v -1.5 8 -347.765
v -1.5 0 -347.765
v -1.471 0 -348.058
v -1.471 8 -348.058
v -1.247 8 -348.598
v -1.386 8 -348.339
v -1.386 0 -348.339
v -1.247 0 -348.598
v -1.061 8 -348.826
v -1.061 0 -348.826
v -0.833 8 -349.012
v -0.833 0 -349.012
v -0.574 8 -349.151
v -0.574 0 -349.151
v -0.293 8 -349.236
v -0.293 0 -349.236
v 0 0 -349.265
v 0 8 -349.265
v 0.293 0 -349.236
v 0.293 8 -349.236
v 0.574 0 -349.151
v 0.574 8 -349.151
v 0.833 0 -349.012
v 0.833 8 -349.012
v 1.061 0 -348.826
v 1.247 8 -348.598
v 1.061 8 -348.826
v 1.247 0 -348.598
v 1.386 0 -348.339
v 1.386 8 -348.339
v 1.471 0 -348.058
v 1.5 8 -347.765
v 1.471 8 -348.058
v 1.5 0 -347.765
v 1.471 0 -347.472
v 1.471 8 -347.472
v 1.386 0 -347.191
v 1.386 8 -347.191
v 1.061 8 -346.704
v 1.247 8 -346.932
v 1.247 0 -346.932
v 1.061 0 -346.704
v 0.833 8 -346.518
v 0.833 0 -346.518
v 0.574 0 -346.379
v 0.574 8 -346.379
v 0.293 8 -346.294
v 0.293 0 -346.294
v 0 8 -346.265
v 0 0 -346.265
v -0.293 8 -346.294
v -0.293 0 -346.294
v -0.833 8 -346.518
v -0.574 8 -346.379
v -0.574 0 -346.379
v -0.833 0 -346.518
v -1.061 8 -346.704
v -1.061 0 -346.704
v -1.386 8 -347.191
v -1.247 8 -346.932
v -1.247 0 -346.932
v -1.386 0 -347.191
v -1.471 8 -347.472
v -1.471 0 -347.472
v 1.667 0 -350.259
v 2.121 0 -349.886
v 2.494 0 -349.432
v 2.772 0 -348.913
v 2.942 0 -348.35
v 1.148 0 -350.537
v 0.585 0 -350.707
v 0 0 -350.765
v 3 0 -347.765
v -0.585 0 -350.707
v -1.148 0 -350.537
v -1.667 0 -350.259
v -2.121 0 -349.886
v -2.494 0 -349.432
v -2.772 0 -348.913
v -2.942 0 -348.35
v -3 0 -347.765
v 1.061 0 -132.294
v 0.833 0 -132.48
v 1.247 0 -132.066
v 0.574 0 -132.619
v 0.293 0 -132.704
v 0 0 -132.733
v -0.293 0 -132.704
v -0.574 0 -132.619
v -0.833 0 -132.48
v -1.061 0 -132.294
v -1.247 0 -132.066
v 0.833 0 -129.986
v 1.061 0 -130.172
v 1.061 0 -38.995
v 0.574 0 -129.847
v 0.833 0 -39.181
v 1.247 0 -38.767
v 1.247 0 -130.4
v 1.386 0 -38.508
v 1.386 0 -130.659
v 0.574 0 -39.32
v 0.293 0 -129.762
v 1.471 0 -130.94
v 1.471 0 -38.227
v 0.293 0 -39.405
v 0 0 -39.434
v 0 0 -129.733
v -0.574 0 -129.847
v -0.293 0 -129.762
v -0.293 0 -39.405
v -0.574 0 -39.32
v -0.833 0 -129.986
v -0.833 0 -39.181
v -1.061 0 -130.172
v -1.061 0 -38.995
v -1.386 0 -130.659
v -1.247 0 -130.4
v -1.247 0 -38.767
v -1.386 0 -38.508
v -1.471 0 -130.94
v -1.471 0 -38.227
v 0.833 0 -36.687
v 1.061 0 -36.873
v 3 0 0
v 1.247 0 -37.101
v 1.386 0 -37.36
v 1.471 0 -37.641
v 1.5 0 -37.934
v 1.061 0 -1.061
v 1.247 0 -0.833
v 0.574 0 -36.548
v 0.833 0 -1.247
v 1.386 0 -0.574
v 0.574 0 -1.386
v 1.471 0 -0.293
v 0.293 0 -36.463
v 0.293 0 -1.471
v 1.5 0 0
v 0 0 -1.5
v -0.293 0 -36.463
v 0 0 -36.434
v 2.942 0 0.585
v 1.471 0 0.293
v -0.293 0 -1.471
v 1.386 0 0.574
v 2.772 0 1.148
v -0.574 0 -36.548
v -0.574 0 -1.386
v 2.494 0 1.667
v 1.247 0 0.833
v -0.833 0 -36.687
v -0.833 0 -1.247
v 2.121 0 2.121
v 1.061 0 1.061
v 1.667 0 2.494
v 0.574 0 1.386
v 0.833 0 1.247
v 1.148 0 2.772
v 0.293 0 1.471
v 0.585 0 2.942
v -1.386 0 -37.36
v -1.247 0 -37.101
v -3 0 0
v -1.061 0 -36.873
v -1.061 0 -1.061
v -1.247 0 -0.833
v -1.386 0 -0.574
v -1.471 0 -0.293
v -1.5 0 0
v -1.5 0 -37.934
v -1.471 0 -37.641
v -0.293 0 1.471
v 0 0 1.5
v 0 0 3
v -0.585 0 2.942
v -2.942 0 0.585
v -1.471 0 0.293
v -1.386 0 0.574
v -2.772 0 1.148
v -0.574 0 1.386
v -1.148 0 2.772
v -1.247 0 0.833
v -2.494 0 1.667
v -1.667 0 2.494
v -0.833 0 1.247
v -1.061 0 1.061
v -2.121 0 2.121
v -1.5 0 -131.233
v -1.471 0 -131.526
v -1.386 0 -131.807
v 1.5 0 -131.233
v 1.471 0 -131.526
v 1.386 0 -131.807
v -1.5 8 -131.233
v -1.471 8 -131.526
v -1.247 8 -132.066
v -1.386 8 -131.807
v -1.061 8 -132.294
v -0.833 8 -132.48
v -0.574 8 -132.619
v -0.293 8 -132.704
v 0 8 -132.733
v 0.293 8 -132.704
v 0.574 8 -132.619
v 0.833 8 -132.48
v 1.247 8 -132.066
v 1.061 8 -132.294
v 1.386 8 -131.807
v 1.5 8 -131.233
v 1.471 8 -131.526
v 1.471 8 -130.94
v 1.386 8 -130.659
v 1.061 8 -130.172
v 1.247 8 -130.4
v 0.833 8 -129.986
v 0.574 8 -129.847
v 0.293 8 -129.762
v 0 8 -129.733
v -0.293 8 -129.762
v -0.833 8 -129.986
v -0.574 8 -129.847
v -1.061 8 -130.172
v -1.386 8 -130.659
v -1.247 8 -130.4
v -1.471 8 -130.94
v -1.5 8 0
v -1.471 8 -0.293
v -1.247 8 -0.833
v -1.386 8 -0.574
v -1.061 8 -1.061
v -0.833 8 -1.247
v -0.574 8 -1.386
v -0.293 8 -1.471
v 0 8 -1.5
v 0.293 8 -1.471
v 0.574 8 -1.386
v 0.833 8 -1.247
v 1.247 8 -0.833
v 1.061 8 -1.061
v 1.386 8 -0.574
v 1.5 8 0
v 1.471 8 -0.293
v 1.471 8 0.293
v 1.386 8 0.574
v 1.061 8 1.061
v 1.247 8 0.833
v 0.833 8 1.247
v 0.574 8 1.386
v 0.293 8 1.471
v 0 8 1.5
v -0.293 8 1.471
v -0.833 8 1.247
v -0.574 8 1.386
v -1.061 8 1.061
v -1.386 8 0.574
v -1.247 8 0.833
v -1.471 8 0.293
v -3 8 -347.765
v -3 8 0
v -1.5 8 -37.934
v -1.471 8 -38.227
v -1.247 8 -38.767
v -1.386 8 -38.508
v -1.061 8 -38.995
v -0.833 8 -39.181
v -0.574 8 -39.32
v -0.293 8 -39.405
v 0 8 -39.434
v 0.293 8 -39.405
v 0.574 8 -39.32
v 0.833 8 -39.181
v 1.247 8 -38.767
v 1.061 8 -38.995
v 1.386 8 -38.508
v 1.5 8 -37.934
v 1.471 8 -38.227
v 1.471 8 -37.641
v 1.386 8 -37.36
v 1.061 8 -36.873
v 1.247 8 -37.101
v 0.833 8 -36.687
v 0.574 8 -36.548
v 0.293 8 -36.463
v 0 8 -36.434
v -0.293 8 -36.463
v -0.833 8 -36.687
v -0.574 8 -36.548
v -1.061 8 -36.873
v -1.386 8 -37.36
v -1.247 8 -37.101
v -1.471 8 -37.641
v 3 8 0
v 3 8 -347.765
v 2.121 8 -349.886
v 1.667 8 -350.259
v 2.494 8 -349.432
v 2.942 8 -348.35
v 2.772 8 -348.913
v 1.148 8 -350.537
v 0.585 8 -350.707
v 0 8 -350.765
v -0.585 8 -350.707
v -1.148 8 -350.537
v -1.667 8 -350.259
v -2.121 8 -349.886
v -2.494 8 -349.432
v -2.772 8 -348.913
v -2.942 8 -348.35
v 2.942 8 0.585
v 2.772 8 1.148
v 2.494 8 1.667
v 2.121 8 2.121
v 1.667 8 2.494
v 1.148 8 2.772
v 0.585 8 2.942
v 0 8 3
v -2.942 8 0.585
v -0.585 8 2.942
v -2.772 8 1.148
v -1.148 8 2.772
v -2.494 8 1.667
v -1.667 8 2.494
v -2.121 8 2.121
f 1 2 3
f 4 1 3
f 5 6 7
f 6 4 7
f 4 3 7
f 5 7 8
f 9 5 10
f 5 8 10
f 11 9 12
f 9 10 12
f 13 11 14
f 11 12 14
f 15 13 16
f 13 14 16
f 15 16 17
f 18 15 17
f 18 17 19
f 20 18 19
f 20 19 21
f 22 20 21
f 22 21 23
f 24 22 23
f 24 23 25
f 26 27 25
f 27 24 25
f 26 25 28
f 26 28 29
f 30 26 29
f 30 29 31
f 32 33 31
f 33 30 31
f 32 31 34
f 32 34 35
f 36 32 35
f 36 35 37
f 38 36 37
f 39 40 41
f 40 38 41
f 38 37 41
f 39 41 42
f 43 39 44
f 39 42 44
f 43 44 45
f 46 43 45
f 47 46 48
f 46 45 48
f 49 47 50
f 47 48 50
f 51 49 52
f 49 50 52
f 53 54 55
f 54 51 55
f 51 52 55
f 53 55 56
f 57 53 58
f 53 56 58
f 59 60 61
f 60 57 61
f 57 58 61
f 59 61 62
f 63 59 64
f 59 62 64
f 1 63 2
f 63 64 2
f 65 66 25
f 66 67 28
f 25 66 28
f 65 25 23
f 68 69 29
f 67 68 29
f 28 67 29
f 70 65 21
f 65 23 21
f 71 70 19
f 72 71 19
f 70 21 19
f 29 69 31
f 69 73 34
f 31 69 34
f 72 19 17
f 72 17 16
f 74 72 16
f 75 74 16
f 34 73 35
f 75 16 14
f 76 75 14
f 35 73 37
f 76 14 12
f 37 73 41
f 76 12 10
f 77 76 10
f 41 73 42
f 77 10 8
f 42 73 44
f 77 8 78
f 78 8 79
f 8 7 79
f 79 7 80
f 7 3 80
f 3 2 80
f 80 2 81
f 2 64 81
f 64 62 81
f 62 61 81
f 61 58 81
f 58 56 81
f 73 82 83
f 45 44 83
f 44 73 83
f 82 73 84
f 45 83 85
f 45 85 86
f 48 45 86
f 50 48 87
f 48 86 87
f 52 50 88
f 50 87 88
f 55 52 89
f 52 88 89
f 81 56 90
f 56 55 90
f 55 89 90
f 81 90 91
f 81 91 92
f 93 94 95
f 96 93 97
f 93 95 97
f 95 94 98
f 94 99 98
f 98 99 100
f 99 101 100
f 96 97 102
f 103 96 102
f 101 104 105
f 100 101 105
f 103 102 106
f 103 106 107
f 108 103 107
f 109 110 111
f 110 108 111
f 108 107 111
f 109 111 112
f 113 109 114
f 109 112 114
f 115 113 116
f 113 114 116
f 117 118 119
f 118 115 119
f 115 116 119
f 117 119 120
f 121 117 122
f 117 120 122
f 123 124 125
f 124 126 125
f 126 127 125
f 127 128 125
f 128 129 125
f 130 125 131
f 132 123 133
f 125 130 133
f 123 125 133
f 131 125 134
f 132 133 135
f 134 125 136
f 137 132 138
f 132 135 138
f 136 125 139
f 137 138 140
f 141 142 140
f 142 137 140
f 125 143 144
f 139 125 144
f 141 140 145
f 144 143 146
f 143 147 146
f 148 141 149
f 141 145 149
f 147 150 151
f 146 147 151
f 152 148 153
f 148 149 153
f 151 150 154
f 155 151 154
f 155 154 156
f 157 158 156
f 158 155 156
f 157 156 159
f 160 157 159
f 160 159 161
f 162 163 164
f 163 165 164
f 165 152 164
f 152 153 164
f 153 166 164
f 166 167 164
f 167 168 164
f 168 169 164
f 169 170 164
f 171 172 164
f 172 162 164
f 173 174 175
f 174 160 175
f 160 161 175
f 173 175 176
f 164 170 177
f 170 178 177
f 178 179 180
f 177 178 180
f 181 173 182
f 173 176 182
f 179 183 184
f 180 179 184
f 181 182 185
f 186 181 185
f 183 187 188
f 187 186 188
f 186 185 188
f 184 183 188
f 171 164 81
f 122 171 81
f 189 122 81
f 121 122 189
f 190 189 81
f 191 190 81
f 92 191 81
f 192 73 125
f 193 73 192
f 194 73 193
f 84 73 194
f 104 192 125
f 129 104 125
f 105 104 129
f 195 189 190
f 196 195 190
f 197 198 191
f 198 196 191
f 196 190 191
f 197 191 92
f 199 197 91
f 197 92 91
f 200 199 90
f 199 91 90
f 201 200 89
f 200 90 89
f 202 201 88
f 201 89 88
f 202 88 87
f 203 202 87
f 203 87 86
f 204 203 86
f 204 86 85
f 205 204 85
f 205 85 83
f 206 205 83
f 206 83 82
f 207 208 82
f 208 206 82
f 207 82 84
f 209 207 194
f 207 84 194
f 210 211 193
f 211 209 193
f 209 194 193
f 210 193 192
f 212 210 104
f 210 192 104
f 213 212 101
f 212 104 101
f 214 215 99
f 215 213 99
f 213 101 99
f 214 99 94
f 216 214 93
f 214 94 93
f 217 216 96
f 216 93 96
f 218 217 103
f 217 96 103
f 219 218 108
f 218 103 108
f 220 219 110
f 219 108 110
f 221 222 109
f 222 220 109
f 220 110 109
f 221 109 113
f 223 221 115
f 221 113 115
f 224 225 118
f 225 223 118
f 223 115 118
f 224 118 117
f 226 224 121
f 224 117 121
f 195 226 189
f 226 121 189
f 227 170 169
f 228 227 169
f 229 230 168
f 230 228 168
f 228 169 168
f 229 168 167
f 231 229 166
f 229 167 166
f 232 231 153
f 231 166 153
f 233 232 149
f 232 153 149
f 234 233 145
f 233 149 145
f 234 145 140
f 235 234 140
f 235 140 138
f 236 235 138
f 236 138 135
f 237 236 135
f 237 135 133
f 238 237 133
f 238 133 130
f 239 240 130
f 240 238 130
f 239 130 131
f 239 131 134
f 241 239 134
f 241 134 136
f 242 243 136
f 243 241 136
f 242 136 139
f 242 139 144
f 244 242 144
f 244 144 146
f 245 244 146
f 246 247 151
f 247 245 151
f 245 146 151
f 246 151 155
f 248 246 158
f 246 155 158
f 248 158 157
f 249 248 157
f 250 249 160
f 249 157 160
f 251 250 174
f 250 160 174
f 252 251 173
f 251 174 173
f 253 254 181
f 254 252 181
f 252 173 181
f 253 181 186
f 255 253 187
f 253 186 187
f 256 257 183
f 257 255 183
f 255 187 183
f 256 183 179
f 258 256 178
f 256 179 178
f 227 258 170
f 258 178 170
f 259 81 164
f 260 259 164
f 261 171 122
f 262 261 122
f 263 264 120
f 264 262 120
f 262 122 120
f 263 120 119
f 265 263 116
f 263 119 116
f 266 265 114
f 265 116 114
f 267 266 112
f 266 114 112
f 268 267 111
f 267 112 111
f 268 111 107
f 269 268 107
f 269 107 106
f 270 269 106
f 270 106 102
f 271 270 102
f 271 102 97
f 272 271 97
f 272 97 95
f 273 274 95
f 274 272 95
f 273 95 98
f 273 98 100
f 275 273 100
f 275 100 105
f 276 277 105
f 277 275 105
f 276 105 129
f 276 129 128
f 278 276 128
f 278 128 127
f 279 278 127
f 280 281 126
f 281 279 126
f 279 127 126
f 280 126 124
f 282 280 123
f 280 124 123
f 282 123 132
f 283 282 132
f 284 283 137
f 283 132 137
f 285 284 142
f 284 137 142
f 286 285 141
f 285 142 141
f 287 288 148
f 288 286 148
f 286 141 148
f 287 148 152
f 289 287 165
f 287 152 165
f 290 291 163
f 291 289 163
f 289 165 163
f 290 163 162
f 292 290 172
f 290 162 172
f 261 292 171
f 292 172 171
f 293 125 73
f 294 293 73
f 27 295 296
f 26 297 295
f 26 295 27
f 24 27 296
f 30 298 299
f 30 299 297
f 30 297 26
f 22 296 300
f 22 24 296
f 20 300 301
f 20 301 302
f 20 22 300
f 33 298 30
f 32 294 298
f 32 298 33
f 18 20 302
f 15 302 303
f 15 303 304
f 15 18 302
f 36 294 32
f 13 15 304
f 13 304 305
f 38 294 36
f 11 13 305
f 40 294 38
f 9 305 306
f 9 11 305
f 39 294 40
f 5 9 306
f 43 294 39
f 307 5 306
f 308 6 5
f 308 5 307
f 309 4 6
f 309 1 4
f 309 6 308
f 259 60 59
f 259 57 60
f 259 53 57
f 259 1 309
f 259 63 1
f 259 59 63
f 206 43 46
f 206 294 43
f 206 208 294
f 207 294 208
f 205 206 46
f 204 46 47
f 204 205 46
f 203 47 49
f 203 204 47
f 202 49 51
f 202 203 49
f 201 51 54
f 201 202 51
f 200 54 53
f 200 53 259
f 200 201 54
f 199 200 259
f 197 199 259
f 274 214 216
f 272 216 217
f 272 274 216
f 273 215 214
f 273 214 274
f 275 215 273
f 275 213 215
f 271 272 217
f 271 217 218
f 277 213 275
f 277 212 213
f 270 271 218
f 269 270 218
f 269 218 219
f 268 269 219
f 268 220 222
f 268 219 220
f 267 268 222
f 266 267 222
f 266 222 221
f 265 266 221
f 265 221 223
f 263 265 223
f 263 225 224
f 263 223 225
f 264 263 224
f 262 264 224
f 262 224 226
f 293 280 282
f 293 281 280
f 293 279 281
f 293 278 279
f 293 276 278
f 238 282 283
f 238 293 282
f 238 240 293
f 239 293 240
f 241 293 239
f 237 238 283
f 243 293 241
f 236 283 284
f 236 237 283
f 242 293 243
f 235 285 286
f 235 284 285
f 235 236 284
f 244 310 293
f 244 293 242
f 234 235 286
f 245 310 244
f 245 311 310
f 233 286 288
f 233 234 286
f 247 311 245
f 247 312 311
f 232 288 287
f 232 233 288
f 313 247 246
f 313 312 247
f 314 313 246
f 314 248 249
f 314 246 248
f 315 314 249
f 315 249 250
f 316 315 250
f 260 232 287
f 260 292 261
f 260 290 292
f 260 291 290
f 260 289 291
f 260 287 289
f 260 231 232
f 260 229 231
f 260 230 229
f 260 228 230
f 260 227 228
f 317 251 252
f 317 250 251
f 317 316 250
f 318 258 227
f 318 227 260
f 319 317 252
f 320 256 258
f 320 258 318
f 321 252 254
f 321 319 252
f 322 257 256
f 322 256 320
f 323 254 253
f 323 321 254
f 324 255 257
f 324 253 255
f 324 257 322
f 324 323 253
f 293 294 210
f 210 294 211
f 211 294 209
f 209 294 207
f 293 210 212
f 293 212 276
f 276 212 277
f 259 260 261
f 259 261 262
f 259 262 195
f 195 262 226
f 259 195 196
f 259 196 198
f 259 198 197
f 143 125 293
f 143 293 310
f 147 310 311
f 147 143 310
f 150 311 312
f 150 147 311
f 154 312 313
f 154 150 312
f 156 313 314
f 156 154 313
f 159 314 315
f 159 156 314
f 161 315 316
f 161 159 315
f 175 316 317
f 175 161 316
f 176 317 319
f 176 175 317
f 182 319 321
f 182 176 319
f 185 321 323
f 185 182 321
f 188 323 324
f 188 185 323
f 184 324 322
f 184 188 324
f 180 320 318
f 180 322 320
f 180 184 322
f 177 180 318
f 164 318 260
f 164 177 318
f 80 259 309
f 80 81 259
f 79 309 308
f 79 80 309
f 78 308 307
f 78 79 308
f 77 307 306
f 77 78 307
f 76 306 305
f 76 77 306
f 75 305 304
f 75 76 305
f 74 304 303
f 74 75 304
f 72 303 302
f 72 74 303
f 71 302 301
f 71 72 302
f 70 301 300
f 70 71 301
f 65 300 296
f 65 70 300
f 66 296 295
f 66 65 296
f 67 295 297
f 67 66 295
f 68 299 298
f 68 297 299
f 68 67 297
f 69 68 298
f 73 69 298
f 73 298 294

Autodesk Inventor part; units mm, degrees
ref_plane "YZ Plane" through (0, 0, 0) normal (1, 0, 0) x (0, 1, 0)
ref_plane "XZ Plane" through (0, 0, 0) normal (0, 1, 0) x (-1, 0, 0)
ref_plane "XY Plane" through (0, 0, 0) normal (0, 0, 1) x (1, 0, 0)
sketch "Sketch1" plane through (0, 0, 0) normal (0, 1, 0) x (-1, 0, 0)
  line L0 (0, 0) -> (0, -347.765) construction
  line L1 (-3, 0) -> (-3, -347.765)
  line L2 (3, -347.765) -> (3, 0)
  arc A0 (3, 0) -> (-3, 0) centre (0, 0) ccw
  arc A1 (-3, -347.765) -> (3, -347.765) centre (0, -347.765) ccw
  circle A2 centre (0, 0) radius 1.5
  circle A3 centre (0, -347.765) radius 1.5
  circle A4 centre (0, -131.233) radius 1.5
  circle A5 centre (0, -37.934) radius 1.5
  point P0 (0, -173.8825)
  dimension "d0" = 347.765
  dimension "d1" = 6
  dimension "d2" = 3
  dimension "d3" = 3
  dimension "d6" = 3
  dimension "d7" = 131.233
  dimension "d8" = 3
  dimension "d9" = 37.934
extrude "Extrusion1" add sketch "Sketch1" along normal blind 8
sketch "Sketch2" plane through (0, 8, 0) normal (0, 1, 0) x (1, 0, 0)
  arc A0 (3, 347.765) -> (-3, 347.765) centre (0, 347.765) ccw projected
  line L0 (-3, 347.765) -> (-3, 0) projected
  arc A1 (-3, 0) -> (3, 0) centre (0, 0) ccw projected
  line L1 (3, 0) -> (3, 347.765) projected
  circle A2 centre (0, 131.233) radius 1.5 projected
  circle A3 centre (0, 37.934) radius 1.5 projected
  circle A4 centre (0, 347.765) radius 1.5 projected
  circle A5 centre (0, 0) radius 1.5 projected
